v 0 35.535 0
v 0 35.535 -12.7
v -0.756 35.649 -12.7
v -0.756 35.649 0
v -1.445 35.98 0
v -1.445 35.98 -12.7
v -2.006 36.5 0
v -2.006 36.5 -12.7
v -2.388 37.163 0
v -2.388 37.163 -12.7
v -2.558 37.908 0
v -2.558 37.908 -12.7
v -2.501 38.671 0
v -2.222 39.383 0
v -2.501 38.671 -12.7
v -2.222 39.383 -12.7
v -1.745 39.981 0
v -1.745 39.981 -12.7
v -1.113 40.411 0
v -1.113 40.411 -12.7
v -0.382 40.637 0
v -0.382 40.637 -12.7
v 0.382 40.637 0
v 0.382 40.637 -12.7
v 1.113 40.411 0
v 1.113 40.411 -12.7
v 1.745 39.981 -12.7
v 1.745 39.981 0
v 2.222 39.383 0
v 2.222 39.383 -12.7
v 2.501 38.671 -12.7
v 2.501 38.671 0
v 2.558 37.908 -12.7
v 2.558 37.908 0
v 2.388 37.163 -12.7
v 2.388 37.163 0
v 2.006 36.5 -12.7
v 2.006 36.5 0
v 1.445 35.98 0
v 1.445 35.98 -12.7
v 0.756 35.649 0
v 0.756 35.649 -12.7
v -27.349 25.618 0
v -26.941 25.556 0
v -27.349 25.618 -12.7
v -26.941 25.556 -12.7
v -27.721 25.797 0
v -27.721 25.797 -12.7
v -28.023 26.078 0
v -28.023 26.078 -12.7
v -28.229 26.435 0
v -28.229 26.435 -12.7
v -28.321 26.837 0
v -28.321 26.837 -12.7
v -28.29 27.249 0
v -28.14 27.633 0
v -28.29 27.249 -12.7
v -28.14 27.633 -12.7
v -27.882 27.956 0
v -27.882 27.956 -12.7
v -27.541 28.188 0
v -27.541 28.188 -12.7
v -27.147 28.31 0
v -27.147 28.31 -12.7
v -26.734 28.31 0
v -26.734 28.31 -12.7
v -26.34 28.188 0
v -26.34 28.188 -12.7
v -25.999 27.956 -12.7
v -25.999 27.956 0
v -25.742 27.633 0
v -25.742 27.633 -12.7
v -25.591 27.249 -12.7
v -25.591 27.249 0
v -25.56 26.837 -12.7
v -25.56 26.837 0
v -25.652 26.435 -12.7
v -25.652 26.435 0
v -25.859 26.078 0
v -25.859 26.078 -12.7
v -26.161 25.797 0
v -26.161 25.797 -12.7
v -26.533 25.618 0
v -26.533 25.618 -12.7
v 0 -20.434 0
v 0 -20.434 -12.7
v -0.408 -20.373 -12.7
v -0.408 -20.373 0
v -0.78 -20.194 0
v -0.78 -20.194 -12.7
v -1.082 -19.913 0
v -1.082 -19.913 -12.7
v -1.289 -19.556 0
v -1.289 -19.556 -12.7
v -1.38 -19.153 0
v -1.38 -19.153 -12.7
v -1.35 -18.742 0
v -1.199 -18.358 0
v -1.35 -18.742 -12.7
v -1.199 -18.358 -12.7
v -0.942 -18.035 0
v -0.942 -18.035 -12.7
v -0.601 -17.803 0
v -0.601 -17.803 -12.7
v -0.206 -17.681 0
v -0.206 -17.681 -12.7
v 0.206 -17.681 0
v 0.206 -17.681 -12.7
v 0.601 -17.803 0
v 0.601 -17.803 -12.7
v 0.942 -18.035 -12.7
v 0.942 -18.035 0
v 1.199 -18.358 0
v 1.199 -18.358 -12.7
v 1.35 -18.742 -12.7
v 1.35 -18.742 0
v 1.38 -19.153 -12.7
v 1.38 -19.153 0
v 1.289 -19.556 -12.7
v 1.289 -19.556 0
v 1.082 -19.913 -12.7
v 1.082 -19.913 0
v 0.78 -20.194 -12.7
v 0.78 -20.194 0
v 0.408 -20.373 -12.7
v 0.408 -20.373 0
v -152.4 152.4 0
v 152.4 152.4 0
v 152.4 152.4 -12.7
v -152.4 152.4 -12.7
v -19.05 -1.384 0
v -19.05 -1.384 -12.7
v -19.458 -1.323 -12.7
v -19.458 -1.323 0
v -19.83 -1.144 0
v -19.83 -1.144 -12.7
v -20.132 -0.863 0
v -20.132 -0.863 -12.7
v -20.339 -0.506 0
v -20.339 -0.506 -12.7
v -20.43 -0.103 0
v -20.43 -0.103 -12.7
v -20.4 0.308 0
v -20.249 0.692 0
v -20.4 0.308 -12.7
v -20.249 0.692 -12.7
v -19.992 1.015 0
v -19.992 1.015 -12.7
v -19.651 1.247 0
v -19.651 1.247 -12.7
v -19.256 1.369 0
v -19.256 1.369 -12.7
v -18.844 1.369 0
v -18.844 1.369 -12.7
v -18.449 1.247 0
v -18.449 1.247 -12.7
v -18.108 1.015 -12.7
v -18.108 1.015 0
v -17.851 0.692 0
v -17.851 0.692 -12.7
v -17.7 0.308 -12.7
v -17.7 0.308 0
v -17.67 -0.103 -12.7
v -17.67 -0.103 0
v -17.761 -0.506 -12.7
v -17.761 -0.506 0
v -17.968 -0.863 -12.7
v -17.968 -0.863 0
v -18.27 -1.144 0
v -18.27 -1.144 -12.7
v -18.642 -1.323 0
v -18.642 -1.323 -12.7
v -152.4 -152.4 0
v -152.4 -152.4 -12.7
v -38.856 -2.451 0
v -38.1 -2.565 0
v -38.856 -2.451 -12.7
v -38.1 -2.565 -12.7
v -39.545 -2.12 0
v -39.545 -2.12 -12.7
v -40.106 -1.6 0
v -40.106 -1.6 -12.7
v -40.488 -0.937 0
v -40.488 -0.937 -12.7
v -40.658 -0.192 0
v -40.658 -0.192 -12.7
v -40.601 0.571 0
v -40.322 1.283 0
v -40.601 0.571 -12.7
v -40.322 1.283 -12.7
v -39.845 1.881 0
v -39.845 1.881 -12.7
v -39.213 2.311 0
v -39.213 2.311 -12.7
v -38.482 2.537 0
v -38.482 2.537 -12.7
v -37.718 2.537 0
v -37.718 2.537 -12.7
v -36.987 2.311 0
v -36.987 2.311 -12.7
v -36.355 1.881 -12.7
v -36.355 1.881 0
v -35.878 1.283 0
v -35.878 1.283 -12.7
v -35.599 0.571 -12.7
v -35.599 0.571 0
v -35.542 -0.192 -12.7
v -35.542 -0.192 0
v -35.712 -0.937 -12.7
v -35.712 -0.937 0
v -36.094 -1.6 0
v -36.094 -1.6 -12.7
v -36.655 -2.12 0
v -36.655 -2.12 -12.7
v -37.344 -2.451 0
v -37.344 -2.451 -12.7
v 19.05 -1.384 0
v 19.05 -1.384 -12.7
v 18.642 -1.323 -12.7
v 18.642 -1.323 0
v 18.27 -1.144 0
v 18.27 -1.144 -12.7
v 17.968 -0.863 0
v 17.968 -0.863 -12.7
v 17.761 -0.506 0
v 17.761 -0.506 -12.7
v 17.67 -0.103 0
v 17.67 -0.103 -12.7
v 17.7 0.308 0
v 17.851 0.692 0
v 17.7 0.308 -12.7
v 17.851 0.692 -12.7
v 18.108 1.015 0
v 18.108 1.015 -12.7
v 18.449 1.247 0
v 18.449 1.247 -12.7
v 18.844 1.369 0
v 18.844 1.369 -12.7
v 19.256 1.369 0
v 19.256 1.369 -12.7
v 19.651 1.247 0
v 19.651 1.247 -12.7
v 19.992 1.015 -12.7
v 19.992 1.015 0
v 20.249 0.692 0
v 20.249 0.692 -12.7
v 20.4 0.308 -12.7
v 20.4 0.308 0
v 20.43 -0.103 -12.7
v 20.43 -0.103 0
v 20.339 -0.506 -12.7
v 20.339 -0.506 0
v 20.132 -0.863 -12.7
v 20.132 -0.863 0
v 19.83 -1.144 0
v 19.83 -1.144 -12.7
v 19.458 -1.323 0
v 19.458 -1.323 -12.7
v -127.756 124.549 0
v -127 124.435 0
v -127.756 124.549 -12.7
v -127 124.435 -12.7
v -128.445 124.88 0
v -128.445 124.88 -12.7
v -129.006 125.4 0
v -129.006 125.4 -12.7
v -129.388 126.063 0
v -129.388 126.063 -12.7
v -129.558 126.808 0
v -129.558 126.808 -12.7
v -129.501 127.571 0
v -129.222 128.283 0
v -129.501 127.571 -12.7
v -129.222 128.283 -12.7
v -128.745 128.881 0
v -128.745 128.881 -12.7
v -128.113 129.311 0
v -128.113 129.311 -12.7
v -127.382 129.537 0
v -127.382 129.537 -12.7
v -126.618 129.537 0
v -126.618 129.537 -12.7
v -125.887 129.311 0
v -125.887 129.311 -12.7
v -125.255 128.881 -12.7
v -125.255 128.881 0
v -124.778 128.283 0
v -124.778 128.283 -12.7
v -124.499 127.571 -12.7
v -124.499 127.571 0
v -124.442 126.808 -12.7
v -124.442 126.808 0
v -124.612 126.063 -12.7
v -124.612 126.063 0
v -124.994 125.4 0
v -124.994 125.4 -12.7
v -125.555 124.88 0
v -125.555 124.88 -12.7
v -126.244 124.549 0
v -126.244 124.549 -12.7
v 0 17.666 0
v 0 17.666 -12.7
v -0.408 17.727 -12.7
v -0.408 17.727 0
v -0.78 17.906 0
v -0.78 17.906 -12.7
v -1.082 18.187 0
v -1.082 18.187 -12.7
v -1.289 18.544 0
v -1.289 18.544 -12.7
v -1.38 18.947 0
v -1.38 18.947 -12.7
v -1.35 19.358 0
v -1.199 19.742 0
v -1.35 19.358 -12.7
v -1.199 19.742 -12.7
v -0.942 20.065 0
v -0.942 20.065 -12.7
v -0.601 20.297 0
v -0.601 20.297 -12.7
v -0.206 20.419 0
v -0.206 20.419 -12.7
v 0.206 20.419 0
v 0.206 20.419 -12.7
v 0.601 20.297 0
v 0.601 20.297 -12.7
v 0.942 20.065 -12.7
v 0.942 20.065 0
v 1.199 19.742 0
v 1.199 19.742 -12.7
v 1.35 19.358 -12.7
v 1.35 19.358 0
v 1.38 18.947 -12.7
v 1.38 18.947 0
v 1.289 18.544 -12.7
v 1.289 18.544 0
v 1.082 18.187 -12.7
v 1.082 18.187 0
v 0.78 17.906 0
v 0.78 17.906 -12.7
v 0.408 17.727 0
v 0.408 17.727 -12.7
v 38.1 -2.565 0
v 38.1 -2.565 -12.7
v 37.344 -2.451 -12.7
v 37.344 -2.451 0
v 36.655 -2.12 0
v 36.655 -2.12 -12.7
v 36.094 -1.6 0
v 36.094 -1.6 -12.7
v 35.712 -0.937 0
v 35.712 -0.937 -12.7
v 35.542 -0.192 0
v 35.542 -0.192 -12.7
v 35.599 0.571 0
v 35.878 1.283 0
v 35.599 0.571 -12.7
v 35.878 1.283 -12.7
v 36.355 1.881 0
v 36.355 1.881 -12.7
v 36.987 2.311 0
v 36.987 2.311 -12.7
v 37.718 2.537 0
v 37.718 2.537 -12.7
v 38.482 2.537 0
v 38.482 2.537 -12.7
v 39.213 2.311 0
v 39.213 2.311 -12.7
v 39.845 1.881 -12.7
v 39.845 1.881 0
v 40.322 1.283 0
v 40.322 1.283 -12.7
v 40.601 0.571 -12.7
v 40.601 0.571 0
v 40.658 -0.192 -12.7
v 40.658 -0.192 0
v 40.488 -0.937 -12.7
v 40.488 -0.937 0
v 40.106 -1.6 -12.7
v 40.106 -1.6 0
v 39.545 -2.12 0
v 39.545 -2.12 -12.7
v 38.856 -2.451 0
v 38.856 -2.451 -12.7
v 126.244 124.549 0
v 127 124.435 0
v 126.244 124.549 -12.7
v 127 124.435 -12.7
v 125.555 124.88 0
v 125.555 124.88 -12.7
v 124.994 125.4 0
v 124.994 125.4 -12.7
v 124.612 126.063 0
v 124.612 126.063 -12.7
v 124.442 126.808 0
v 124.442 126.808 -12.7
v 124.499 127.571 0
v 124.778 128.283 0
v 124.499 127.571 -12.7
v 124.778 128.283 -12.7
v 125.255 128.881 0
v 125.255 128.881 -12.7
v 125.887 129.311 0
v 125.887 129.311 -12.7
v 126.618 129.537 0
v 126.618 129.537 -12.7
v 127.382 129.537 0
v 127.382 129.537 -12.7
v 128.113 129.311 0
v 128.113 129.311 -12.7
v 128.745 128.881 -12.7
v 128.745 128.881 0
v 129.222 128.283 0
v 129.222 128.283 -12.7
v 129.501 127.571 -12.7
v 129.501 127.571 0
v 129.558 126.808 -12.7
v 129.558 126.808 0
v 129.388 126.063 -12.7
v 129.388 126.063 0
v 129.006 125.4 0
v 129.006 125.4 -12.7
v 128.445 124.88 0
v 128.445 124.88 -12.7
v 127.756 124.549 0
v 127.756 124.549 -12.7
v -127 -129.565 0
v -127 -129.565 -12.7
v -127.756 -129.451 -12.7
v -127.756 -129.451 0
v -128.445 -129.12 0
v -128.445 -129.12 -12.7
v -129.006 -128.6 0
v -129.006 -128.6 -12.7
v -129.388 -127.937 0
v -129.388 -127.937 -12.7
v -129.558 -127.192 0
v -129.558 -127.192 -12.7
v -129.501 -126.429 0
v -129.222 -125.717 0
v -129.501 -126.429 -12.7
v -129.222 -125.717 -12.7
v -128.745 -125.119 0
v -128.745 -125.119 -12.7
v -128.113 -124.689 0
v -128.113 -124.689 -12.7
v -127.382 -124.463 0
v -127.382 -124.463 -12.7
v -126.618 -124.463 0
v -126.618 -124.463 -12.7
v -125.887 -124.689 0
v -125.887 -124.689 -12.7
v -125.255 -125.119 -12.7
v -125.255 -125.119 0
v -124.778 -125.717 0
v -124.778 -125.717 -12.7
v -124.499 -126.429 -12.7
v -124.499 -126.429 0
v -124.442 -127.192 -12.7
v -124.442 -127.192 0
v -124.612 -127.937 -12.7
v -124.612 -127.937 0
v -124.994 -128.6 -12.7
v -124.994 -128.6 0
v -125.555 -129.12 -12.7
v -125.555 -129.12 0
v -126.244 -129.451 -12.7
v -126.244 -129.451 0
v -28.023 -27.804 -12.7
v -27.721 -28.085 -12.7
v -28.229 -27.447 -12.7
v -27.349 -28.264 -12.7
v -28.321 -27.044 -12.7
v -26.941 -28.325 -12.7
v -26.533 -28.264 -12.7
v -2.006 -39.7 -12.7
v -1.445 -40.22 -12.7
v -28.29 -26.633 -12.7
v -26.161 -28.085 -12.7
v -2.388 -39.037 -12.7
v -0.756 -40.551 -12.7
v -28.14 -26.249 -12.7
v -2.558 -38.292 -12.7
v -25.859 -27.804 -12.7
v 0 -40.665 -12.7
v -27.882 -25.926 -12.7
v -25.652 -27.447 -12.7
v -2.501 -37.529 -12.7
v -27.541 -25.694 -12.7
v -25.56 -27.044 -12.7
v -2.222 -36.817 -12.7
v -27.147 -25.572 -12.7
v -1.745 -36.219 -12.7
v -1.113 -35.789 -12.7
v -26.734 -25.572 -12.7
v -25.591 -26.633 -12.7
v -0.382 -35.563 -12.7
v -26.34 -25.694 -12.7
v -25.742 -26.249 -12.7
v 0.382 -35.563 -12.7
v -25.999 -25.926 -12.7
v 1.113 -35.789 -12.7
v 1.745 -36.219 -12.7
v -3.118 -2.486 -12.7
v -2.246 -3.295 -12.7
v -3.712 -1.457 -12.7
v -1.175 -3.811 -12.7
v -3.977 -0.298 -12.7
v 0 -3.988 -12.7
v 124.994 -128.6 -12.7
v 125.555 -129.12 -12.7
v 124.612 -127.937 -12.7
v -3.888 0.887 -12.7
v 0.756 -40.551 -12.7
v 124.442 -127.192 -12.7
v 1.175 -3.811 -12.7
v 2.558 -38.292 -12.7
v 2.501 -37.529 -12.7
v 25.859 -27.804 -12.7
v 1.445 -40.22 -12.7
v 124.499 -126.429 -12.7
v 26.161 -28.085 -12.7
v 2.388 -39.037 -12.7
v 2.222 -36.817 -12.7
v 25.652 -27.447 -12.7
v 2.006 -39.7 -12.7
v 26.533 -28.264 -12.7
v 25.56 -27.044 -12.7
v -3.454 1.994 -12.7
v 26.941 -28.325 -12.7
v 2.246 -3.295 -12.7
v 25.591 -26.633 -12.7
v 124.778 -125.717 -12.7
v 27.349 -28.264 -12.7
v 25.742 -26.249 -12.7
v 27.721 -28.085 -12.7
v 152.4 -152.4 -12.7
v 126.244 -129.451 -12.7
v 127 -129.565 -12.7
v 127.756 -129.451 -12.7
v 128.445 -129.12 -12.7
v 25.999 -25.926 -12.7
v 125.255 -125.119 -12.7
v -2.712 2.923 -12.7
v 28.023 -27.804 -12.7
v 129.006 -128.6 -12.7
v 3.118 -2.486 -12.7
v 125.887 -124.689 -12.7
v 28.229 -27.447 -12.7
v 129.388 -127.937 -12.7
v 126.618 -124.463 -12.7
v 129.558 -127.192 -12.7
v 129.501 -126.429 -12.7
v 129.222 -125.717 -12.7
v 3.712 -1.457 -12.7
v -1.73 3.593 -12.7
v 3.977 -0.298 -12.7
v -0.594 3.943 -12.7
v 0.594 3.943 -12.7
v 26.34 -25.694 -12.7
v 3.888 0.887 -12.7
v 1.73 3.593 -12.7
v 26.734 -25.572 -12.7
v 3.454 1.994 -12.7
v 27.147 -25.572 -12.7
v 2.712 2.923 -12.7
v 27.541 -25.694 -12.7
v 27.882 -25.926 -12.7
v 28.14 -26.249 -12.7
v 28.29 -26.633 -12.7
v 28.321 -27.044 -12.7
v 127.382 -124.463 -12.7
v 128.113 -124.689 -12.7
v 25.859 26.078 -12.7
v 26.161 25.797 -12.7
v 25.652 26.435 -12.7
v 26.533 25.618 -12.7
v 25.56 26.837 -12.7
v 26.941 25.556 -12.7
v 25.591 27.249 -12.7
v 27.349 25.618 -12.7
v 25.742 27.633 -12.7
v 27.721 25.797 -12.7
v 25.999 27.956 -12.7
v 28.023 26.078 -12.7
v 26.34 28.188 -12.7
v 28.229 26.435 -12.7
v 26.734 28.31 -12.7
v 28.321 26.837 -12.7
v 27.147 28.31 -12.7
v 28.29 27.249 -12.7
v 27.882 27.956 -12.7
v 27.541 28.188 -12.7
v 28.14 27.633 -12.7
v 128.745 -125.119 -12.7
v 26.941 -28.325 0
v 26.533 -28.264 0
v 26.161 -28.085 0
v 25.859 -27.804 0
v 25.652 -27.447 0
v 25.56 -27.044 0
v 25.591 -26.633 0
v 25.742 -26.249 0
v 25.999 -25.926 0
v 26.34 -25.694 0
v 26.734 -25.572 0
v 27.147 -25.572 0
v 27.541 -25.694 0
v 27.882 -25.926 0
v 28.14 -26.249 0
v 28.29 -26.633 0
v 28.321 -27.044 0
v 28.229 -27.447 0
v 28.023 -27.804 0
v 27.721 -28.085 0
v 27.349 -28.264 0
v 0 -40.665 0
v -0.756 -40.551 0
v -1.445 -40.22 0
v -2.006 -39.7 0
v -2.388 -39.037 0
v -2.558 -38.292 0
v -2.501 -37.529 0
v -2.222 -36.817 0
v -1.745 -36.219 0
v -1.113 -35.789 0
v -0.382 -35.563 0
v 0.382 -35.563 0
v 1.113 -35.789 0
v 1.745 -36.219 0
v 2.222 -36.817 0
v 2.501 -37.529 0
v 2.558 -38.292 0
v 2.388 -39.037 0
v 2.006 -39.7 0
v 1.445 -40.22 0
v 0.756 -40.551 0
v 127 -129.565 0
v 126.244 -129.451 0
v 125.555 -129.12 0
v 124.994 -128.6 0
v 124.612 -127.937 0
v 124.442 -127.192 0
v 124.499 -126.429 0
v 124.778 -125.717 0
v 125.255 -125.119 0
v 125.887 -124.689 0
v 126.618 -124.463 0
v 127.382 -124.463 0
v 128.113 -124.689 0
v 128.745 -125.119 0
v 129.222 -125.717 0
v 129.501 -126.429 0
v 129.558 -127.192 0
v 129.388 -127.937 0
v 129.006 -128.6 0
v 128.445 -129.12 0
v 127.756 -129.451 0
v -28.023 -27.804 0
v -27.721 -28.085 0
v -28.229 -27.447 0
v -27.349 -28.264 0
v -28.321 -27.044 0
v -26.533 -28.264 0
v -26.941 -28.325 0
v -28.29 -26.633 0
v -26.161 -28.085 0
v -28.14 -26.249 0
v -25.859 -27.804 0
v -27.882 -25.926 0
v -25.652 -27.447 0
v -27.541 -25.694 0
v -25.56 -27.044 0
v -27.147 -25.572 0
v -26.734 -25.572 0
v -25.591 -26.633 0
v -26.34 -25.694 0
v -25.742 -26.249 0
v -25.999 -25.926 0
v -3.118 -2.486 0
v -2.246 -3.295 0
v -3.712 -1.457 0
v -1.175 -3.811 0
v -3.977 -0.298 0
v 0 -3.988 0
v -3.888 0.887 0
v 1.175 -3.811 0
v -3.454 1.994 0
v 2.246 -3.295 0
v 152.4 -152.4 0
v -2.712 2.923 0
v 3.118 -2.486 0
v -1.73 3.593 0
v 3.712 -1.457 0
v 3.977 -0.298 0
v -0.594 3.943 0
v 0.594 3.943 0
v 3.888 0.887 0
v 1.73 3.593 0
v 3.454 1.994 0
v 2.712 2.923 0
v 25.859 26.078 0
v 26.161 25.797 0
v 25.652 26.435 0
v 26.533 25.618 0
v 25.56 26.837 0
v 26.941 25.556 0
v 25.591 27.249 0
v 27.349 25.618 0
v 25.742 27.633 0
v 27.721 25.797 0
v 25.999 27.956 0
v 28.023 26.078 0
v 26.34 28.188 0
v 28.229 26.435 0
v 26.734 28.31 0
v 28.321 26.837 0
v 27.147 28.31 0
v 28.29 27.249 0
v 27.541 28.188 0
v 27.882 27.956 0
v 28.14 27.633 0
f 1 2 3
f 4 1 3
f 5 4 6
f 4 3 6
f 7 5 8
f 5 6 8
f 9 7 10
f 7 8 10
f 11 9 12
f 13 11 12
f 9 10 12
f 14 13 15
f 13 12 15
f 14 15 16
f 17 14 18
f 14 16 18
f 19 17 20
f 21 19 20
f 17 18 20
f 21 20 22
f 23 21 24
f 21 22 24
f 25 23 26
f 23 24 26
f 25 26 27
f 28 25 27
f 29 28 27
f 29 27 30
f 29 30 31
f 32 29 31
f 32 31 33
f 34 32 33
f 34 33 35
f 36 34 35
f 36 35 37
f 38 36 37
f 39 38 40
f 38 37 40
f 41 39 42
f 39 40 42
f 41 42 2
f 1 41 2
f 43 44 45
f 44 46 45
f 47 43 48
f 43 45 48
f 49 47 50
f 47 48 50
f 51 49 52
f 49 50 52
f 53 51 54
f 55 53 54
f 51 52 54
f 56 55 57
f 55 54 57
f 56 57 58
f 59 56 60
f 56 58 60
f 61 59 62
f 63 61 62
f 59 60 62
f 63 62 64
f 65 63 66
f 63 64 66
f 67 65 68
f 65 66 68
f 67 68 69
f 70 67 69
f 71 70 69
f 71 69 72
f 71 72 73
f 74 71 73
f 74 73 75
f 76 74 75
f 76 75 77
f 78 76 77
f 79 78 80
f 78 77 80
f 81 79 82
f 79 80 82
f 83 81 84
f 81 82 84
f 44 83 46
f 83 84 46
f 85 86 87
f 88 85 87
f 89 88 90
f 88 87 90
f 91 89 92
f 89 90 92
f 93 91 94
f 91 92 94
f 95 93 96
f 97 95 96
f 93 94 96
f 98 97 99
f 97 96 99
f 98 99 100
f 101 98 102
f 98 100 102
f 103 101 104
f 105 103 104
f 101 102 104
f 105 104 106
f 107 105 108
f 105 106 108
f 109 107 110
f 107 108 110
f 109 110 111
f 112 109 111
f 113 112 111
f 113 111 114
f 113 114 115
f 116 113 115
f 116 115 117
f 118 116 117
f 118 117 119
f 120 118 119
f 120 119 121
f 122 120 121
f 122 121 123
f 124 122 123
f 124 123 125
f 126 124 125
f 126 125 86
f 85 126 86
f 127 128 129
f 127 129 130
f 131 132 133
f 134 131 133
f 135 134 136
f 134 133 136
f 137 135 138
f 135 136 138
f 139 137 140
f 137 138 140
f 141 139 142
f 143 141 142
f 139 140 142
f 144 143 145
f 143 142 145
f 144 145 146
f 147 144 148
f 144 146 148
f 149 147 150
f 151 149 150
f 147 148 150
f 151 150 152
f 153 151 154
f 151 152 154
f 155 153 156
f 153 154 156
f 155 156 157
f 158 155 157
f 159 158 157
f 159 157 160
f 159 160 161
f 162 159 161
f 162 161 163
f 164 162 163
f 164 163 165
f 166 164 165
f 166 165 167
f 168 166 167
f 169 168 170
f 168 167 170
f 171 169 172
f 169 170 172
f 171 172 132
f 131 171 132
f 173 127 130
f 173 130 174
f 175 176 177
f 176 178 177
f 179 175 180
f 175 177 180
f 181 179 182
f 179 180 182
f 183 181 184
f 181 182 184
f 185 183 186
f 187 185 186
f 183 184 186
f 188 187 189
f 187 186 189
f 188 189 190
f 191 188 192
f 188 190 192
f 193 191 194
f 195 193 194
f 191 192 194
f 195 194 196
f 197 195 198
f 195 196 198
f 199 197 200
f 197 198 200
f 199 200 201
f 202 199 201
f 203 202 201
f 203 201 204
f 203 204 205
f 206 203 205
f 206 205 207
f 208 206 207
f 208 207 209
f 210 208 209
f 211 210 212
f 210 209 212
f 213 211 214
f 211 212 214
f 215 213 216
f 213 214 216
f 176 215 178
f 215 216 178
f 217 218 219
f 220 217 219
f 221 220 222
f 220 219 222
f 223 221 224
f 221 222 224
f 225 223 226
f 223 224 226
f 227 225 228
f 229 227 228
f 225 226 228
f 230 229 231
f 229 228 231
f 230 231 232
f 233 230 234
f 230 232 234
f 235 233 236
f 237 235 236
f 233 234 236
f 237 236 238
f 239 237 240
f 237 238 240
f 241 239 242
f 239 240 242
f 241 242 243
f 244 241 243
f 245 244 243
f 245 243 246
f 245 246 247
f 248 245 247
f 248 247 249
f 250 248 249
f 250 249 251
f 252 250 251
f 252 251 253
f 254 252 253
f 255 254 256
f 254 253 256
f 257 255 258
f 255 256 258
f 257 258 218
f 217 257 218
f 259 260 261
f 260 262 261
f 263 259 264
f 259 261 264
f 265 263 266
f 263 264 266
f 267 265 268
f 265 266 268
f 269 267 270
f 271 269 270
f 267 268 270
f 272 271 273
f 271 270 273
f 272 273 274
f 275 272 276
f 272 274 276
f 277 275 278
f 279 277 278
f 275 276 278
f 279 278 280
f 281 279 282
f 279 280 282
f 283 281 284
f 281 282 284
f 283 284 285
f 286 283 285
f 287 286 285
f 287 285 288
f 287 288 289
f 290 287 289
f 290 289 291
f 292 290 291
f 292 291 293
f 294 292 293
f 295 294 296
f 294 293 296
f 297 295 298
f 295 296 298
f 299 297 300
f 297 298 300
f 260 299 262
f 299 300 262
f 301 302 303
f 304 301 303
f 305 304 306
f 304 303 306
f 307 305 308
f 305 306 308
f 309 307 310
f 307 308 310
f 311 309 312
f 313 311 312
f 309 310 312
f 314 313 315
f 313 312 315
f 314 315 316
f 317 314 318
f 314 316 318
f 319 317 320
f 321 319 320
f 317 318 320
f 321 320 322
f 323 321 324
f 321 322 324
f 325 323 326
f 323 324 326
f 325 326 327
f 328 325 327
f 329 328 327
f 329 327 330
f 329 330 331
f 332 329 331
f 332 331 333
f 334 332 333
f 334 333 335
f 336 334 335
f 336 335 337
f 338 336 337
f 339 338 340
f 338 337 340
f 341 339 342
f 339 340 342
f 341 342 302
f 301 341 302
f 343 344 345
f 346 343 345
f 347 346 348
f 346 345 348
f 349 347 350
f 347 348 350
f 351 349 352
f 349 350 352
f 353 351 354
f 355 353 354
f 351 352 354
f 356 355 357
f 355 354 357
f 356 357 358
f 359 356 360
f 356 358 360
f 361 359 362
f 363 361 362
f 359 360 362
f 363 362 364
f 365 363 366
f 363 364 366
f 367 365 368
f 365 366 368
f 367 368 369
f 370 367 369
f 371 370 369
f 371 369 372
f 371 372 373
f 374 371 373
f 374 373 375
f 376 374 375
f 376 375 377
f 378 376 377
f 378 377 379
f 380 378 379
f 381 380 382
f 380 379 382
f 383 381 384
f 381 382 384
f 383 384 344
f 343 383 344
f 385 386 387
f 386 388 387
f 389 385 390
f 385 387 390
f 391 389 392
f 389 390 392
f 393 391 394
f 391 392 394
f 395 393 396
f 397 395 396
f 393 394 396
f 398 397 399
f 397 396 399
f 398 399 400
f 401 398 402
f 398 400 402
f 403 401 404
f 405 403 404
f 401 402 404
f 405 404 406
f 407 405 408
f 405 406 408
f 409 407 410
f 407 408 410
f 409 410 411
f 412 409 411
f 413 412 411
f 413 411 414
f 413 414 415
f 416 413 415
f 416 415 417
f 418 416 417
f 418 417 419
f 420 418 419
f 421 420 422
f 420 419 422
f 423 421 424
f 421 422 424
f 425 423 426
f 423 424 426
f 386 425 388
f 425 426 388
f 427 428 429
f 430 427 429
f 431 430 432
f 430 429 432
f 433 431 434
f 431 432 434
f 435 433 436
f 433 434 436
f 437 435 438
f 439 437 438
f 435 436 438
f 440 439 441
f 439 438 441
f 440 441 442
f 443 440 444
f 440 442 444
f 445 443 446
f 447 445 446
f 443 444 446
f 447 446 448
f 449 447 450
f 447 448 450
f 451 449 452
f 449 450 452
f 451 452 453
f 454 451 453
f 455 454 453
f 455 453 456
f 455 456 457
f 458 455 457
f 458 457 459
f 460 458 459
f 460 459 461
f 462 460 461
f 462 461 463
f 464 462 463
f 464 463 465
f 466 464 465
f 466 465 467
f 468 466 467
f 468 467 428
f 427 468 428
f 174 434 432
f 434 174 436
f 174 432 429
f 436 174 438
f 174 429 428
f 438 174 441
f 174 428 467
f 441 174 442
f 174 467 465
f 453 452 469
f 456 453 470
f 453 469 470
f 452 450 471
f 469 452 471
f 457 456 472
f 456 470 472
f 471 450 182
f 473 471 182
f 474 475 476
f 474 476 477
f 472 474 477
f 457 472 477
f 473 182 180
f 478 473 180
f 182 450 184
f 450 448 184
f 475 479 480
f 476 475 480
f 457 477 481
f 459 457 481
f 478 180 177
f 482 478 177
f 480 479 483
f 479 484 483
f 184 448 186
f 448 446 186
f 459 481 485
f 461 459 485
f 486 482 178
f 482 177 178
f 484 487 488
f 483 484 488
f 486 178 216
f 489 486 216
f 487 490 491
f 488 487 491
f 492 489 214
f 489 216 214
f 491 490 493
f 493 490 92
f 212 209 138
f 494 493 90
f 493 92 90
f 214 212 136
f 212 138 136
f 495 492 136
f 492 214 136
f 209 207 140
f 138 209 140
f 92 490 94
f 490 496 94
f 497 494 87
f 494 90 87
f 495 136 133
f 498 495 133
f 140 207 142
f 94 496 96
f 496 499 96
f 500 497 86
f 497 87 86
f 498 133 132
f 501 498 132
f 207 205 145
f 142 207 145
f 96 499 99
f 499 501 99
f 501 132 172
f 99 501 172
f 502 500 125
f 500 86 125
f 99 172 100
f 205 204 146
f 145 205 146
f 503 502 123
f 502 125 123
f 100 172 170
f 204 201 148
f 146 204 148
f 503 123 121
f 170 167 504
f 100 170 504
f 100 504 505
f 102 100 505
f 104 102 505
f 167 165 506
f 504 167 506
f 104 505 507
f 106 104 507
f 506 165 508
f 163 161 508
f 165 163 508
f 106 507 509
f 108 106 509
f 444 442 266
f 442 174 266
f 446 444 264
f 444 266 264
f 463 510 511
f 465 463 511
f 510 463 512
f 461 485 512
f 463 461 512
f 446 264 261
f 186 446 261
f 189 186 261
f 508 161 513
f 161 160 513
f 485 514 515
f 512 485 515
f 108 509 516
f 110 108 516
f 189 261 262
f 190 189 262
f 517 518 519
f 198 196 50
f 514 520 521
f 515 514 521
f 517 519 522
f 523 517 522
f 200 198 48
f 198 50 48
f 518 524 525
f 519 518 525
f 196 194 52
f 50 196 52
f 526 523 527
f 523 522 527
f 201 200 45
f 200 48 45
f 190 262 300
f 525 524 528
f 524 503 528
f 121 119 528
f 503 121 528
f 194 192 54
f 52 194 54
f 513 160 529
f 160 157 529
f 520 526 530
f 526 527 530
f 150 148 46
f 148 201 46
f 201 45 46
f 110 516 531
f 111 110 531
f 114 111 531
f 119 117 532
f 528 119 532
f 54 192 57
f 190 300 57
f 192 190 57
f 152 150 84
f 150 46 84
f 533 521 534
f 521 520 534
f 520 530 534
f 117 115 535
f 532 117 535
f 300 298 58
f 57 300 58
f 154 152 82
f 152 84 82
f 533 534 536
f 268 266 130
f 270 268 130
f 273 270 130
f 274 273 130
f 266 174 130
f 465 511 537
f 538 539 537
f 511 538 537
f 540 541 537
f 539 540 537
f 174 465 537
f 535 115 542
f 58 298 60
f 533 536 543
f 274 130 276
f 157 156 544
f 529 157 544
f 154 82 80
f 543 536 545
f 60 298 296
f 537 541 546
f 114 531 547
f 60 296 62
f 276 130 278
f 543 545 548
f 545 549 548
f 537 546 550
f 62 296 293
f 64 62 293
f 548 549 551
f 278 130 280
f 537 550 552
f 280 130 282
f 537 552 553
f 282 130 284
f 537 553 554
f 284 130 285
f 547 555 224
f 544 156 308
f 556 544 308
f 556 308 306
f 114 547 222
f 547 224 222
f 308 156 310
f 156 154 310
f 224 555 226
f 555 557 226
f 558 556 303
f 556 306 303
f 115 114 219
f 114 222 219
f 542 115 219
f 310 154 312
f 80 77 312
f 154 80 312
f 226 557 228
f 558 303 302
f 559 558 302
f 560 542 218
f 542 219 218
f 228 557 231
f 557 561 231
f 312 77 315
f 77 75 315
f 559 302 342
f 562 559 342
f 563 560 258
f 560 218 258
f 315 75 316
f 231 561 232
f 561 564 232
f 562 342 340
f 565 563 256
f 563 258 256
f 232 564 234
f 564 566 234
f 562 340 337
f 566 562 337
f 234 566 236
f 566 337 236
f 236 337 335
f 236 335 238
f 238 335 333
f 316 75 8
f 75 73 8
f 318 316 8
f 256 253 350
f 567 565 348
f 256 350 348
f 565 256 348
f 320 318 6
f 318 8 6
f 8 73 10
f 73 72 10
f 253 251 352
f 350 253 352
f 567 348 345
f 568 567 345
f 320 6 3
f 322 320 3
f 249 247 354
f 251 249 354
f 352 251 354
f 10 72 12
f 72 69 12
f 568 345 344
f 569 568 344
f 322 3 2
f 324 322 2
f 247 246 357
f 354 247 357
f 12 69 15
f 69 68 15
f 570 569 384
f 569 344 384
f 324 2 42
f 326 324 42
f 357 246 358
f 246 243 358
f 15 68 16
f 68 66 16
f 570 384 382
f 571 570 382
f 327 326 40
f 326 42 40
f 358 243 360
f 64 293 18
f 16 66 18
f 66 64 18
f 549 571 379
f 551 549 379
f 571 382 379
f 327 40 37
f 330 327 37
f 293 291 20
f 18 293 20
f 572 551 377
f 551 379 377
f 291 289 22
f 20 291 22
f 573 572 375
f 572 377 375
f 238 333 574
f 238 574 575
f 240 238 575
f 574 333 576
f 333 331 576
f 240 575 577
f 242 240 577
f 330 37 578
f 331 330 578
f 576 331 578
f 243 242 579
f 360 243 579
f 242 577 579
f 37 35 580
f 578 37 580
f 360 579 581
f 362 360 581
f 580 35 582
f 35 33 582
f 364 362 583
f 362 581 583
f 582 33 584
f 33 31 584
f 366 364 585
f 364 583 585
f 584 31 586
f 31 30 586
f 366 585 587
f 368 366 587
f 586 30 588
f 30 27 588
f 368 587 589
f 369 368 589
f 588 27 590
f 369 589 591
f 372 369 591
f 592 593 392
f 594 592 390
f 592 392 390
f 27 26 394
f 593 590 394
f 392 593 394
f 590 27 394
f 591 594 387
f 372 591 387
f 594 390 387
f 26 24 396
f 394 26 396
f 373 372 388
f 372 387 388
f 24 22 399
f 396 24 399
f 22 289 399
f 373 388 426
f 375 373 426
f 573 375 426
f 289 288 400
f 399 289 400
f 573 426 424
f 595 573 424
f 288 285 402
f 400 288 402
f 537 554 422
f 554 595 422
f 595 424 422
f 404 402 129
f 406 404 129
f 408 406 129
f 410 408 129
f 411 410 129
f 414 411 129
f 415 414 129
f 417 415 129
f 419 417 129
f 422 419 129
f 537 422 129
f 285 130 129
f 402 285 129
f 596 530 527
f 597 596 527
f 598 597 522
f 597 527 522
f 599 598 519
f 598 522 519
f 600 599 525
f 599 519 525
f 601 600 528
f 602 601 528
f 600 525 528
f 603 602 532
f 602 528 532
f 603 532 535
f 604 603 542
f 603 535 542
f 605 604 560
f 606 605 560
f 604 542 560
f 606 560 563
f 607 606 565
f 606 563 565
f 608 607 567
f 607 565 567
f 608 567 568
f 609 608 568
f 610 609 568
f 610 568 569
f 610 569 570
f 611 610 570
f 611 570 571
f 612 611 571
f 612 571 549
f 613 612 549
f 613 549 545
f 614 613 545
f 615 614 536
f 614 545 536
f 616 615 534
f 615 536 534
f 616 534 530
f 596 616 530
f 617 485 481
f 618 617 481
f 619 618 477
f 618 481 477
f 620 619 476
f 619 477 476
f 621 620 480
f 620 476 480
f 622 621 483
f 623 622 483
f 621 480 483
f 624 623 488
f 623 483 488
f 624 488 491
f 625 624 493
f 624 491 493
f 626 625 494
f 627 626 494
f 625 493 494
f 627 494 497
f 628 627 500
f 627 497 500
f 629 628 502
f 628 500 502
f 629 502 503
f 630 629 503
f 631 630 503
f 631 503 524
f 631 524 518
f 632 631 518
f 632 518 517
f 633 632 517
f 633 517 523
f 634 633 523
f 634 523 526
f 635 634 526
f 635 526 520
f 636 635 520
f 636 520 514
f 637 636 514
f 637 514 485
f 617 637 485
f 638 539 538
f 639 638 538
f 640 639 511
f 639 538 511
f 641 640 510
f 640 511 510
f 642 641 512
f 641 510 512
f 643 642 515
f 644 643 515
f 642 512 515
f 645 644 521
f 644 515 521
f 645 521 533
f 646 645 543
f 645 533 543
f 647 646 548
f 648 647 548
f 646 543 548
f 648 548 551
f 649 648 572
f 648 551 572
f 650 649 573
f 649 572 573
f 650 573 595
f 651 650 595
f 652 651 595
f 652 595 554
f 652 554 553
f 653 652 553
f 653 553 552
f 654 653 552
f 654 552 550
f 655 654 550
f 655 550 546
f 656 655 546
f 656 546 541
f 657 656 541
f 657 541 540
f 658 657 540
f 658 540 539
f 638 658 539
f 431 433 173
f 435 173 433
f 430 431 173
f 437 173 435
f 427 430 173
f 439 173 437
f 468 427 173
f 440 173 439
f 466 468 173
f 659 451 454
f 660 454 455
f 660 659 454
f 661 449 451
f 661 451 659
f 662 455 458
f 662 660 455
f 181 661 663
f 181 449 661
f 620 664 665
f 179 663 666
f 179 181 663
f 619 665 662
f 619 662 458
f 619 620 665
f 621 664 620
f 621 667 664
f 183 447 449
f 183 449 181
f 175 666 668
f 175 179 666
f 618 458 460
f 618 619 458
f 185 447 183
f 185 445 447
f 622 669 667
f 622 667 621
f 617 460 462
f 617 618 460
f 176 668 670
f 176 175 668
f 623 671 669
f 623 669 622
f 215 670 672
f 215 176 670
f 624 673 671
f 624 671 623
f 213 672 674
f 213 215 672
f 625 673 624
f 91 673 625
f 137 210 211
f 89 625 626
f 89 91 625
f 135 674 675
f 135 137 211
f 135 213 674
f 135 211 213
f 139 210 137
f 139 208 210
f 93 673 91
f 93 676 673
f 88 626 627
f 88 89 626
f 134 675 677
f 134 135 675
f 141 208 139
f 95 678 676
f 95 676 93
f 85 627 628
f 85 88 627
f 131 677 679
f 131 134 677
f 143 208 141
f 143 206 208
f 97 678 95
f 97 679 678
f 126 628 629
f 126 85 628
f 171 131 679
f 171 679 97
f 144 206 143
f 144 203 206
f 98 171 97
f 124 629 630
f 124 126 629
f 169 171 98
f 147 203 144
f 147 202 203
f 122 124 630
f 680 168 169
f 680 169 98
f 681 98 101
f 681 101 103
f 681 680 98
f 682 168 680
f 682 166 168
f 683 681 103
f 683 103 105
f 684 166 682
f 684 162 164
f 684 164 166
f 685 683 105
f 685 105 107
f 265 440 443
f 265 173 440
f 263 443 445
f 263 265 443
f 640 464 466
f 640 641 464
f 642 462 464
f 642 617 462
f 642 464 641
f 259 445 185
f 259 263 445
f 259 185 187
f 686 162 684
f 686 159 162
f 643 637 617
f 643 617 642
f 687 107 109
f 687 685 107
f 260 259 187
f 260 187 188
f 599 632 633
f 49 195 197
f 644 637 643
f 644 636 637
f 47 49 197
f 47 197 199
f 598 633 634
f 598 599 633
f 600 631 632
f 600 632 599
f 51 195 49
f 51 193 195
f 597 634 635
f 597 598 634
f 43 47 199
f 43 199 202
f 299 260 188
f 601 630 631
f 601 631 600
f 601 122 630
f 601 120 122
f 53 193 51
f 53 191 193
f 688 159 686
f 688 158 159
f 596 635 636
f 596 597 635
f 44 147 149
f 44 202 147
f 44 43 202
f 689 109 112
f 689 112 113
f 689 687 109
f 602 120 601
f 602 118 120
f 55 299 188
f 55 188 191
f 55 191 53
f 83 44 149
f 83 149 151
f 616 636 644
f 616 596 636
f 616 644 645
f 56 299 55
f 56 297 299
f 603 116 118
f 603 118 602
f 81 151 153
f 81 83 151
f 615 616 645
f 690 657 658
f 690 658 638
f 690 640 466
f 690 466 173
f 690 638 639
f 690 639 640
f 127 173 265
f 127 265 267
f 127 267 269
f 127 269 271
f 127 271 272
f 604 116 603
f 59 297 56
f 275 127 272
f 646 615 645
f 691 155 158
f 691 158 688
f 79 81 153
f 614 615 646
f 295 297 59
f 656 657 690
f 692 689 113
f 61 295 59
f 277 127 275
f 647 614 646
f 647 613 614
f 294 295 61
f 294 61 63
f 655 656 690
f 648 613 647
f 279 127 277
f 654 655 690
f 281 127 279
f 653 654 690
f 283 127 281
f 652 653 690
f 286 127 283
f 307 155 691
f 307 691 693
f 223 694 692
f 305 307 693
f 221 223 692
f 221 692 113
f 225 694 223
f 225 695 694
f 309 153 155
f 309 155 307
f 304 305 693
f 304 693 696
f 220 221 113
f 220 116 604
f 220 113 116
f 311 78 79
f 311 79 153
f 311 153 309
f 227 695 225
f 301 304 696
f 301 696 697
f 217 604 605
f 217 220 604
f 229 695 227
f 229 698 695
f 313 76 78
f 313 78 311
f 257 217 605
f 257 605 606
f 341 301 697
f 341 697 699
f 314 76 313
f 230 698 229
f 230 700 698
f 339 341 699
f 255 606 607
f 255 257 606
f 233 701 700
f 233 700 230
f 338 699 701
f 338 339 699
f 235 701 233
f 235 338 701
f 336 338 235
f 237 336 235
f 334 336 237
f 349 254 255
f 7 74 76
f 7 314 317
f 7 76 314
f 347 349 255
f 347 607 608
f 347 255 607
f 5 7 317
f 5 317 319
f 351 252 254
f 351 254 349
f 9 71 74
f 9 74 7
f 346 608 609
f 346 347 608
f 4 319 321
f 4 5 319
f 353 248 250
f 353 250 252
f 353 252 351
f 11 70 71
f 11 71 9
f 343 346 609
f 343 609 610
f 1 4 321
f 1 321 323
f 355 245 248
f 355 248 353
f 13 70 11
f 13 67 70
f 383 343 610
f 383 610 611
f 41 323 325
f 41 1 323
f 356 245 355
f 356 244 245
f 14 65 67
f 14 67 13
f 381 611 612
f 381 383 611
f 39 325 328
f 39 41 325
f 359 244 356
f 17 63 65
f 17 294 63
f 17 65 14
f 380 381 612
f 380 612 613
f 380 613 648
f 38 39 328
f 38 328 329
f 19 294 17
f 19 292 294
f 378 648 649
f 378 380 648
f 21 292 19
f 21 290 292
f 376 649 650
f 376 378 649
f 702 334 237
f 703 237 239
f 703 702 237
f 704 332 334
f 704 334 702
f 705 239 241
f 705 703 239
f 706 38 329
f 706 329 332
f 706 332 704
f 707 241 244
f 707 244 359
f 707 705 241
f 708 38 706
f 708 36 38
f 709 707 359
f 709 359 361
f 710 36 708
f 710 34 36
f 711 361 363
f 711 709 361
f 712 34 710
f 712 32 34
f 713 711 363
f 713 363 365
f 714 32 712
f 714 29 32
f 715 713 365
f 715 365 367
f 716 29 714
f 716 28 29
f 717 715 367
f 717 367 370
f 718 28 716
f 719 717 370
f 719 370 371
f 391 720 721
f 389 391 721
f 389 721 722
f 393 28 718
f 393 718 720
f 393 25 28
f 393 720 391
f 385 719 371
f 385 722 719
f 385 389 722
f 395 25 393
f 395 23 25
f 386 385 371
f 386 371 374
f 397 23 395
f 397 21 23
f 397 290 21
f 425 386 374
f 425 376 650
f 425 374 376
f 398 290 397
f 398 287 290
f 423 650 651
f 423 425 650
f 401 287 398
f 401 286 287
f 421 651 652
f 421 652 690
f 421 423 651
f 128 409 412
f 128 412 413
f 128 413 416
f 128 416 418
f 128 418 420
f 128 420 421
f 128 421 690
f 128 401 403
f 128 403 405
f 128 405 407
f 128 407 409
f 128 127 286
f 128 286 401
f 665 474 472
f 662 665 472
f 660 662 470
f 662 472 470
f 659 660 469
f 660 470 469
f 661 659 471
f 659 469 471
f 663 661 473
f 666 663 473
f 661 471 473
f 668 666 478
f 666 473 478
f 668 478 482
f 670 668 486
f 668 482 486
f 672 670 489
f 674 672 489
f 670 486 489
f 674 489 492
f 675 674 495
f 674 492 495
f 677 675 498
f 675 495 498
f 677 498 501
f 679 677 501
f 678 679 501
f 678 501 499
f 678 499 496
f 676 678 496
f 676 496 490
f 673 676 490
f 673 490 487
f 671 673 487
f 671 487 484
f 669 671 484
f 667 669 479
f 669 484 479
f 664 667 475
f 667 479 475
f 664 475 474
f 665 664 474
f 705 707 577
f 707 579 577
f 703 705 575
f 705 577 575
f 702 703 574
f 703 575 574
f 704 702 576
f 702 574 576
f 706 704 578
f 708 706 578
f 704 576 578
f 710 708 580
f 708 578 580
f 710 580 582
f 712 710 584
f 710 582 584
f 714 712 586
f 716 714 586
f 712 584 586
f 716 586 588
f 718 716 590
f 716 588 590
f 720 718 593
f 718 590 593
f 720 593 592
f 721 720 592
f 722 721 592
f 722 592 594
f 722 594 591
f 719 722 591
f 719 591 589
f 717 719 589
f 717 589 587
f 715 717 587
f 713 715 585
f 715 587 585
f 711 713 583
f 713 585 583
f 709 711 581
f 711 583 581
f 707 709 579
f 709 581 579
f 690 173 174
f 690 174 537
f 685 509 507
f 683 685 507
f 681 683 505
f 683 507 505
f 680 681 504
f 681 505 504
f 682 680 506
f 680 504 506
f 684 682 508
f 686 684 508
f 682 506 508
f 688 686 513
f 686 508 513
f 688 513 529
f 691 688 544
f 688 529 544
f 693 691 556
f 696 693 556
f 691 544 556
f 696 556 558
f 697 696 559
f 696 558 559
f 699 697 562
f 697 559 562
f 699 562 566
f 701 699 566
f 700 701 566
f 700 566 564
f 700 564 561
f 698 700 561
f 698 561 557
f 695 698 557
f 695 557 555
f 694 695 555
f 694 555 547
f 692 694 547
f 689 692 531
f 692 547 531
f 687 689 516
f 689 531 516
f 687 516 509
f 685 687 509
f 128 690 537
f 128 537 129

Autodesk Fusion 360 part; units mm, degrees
sketch "Sketch1" plane through (0, 0, 0) normal (0, 0, 1) x (1, 0, 0)
  line L0 (-152.4, -152.4) -> (152.4, -152.4)
  line L1 (152.4, -152.4) -> (152.4, 152.4)
  line L2 (152.4, 152.4) -> (-152.4, 152.4)
  line L3 (-152.4, 152.4) -> (-152.4, -152.4)
  line L4 (-127, -127) -> (127, -127)
  line L5 (127, -127) -> (127, 127)
  line L6 (127, 127) -> (-127, 127)
  line L7 (-127, 127) -> (-127, -127)
  circle A0 centre (0, 0) radius 45
  circle A1 centre (0, 0) radius 38.1
  circle A2 centre (0, 0) radius 19.05
  line L8 (0, 0) -> (-38.1, 0)
  line L9 (0, 0) -> (0, 38.1)
  line L10 (0, 0) -> (38.1, 0)
  line L11 (0, 0) -> (0, -38.1)
  line L12 (0, 0) -> (26.9408, 26.9408)
  line L13 (0, 0) -> (38.1, 0) construction
  line L14 (0, 0) -> (26.9408, -26.9408)
  line L15 (0, 0) -> (38.1, 0) construction
  line L16 (0, 0) -> (-26.9408, -26.9408)
  line L17 (0, 0) -> (38.1, 0) construction
  line L18 (0, 0) -> (-26.9408, 26.9408)
  line L19 (0, 0) -> (38.1, 0) construction
  point P0 (0, 19.05)
  point P1 (19.05, 0)
  point P2 (0, -19.05)
  point P3 (-19.05, 0)
  dimension "d1" = 304.8
  dimension "d2" = 304.8
  dimension "d3" = 254
  dimension "d4" = 254
  dimension "d5" = 90
  dimension "d6" = 76.2
  dimension "d7" = 38.1
  dimension "d8" = 38.1
  dimension "d9" = 38.1
  dimension "d10" = 38.1
  dimension "d11" = 38.1
  dimension "d12" = 45
  dimension "d13" = 45
  dimension "d14" = 135
  dimension "d15" = 135
extrude "Extrude1" add sketch "Sketch1" against normal blind 12.7 contours L0 L1 L2 L3 | L4 L5 L6 L7 | A0 | A1 A2 L10 L12 | A1 A2 L10 L14 | A1 A2 L9 L12 | A1 A2 L11 L14 | A2 L10 L12 | A2 L10 L14 | A1 A2 L9 L18 | A2 L9 L12 | A1 A2 L11 L16 | A2 L11 L14 | A2 L8 L16 | A2 L9 L18 | A2 L11 L16 | A2 L8 L18 | A1 A2 L8 L18 | A1 A2 L8 L16 makes body 1 in component "PT785S_Base_Mount"
hole "Hole1" at (-127, 127, 0) at (127, 127, 0) at (127, -127, 0) at (-127, -127, 0) at (-38.1, 0, 0) at (0, 38.1, 0) at (38.1, 0, 0) at (0, -38.1, 0) direction (0, 0, -1) diameter 5.1308 depth 12.7 tip angle 180 bodies 1 in component "PT785S_Base_Mount"
hole "Hole2" at (-26.9408, 26.9408, 0) at (26.9408, 26.9408, 0) at (26.9408, -26.9408, 0) at (-26.9408, -26.9408, 0) at (-19.05, 0, 0) at (0, 19.05, 0) at (19.05, 0, 0) at (0, -19.05, 0) direction (0, 0, -1) diameter 2.7686 depth 12.7 tip angle 180 bodies 1 in component "PT785S_Base_Mount"
hole "Hole3" at (0, 0, 0) direction (0, 0, -1) diameter 7.9756 depth 12.7 tip angle 180 bodies 1 in component "PT785S_Base_Mount"
copy_body "Body->Comp1" bodies 1 removing the originals makes body 2 in component "Aluminum_6061_Plate"
component "PT785S_Base_Mount" placed x (1, 0, 0) y (0, 1, 0) z (0, 0, 1) at (0, 0, 0)
component "Aluminum_6061_Plate" placed x (1, 0, 0) y (0, 1, 0) z (0, 0, 1) at (0, 0, 0) in component "PT785S_Base_Mount"
